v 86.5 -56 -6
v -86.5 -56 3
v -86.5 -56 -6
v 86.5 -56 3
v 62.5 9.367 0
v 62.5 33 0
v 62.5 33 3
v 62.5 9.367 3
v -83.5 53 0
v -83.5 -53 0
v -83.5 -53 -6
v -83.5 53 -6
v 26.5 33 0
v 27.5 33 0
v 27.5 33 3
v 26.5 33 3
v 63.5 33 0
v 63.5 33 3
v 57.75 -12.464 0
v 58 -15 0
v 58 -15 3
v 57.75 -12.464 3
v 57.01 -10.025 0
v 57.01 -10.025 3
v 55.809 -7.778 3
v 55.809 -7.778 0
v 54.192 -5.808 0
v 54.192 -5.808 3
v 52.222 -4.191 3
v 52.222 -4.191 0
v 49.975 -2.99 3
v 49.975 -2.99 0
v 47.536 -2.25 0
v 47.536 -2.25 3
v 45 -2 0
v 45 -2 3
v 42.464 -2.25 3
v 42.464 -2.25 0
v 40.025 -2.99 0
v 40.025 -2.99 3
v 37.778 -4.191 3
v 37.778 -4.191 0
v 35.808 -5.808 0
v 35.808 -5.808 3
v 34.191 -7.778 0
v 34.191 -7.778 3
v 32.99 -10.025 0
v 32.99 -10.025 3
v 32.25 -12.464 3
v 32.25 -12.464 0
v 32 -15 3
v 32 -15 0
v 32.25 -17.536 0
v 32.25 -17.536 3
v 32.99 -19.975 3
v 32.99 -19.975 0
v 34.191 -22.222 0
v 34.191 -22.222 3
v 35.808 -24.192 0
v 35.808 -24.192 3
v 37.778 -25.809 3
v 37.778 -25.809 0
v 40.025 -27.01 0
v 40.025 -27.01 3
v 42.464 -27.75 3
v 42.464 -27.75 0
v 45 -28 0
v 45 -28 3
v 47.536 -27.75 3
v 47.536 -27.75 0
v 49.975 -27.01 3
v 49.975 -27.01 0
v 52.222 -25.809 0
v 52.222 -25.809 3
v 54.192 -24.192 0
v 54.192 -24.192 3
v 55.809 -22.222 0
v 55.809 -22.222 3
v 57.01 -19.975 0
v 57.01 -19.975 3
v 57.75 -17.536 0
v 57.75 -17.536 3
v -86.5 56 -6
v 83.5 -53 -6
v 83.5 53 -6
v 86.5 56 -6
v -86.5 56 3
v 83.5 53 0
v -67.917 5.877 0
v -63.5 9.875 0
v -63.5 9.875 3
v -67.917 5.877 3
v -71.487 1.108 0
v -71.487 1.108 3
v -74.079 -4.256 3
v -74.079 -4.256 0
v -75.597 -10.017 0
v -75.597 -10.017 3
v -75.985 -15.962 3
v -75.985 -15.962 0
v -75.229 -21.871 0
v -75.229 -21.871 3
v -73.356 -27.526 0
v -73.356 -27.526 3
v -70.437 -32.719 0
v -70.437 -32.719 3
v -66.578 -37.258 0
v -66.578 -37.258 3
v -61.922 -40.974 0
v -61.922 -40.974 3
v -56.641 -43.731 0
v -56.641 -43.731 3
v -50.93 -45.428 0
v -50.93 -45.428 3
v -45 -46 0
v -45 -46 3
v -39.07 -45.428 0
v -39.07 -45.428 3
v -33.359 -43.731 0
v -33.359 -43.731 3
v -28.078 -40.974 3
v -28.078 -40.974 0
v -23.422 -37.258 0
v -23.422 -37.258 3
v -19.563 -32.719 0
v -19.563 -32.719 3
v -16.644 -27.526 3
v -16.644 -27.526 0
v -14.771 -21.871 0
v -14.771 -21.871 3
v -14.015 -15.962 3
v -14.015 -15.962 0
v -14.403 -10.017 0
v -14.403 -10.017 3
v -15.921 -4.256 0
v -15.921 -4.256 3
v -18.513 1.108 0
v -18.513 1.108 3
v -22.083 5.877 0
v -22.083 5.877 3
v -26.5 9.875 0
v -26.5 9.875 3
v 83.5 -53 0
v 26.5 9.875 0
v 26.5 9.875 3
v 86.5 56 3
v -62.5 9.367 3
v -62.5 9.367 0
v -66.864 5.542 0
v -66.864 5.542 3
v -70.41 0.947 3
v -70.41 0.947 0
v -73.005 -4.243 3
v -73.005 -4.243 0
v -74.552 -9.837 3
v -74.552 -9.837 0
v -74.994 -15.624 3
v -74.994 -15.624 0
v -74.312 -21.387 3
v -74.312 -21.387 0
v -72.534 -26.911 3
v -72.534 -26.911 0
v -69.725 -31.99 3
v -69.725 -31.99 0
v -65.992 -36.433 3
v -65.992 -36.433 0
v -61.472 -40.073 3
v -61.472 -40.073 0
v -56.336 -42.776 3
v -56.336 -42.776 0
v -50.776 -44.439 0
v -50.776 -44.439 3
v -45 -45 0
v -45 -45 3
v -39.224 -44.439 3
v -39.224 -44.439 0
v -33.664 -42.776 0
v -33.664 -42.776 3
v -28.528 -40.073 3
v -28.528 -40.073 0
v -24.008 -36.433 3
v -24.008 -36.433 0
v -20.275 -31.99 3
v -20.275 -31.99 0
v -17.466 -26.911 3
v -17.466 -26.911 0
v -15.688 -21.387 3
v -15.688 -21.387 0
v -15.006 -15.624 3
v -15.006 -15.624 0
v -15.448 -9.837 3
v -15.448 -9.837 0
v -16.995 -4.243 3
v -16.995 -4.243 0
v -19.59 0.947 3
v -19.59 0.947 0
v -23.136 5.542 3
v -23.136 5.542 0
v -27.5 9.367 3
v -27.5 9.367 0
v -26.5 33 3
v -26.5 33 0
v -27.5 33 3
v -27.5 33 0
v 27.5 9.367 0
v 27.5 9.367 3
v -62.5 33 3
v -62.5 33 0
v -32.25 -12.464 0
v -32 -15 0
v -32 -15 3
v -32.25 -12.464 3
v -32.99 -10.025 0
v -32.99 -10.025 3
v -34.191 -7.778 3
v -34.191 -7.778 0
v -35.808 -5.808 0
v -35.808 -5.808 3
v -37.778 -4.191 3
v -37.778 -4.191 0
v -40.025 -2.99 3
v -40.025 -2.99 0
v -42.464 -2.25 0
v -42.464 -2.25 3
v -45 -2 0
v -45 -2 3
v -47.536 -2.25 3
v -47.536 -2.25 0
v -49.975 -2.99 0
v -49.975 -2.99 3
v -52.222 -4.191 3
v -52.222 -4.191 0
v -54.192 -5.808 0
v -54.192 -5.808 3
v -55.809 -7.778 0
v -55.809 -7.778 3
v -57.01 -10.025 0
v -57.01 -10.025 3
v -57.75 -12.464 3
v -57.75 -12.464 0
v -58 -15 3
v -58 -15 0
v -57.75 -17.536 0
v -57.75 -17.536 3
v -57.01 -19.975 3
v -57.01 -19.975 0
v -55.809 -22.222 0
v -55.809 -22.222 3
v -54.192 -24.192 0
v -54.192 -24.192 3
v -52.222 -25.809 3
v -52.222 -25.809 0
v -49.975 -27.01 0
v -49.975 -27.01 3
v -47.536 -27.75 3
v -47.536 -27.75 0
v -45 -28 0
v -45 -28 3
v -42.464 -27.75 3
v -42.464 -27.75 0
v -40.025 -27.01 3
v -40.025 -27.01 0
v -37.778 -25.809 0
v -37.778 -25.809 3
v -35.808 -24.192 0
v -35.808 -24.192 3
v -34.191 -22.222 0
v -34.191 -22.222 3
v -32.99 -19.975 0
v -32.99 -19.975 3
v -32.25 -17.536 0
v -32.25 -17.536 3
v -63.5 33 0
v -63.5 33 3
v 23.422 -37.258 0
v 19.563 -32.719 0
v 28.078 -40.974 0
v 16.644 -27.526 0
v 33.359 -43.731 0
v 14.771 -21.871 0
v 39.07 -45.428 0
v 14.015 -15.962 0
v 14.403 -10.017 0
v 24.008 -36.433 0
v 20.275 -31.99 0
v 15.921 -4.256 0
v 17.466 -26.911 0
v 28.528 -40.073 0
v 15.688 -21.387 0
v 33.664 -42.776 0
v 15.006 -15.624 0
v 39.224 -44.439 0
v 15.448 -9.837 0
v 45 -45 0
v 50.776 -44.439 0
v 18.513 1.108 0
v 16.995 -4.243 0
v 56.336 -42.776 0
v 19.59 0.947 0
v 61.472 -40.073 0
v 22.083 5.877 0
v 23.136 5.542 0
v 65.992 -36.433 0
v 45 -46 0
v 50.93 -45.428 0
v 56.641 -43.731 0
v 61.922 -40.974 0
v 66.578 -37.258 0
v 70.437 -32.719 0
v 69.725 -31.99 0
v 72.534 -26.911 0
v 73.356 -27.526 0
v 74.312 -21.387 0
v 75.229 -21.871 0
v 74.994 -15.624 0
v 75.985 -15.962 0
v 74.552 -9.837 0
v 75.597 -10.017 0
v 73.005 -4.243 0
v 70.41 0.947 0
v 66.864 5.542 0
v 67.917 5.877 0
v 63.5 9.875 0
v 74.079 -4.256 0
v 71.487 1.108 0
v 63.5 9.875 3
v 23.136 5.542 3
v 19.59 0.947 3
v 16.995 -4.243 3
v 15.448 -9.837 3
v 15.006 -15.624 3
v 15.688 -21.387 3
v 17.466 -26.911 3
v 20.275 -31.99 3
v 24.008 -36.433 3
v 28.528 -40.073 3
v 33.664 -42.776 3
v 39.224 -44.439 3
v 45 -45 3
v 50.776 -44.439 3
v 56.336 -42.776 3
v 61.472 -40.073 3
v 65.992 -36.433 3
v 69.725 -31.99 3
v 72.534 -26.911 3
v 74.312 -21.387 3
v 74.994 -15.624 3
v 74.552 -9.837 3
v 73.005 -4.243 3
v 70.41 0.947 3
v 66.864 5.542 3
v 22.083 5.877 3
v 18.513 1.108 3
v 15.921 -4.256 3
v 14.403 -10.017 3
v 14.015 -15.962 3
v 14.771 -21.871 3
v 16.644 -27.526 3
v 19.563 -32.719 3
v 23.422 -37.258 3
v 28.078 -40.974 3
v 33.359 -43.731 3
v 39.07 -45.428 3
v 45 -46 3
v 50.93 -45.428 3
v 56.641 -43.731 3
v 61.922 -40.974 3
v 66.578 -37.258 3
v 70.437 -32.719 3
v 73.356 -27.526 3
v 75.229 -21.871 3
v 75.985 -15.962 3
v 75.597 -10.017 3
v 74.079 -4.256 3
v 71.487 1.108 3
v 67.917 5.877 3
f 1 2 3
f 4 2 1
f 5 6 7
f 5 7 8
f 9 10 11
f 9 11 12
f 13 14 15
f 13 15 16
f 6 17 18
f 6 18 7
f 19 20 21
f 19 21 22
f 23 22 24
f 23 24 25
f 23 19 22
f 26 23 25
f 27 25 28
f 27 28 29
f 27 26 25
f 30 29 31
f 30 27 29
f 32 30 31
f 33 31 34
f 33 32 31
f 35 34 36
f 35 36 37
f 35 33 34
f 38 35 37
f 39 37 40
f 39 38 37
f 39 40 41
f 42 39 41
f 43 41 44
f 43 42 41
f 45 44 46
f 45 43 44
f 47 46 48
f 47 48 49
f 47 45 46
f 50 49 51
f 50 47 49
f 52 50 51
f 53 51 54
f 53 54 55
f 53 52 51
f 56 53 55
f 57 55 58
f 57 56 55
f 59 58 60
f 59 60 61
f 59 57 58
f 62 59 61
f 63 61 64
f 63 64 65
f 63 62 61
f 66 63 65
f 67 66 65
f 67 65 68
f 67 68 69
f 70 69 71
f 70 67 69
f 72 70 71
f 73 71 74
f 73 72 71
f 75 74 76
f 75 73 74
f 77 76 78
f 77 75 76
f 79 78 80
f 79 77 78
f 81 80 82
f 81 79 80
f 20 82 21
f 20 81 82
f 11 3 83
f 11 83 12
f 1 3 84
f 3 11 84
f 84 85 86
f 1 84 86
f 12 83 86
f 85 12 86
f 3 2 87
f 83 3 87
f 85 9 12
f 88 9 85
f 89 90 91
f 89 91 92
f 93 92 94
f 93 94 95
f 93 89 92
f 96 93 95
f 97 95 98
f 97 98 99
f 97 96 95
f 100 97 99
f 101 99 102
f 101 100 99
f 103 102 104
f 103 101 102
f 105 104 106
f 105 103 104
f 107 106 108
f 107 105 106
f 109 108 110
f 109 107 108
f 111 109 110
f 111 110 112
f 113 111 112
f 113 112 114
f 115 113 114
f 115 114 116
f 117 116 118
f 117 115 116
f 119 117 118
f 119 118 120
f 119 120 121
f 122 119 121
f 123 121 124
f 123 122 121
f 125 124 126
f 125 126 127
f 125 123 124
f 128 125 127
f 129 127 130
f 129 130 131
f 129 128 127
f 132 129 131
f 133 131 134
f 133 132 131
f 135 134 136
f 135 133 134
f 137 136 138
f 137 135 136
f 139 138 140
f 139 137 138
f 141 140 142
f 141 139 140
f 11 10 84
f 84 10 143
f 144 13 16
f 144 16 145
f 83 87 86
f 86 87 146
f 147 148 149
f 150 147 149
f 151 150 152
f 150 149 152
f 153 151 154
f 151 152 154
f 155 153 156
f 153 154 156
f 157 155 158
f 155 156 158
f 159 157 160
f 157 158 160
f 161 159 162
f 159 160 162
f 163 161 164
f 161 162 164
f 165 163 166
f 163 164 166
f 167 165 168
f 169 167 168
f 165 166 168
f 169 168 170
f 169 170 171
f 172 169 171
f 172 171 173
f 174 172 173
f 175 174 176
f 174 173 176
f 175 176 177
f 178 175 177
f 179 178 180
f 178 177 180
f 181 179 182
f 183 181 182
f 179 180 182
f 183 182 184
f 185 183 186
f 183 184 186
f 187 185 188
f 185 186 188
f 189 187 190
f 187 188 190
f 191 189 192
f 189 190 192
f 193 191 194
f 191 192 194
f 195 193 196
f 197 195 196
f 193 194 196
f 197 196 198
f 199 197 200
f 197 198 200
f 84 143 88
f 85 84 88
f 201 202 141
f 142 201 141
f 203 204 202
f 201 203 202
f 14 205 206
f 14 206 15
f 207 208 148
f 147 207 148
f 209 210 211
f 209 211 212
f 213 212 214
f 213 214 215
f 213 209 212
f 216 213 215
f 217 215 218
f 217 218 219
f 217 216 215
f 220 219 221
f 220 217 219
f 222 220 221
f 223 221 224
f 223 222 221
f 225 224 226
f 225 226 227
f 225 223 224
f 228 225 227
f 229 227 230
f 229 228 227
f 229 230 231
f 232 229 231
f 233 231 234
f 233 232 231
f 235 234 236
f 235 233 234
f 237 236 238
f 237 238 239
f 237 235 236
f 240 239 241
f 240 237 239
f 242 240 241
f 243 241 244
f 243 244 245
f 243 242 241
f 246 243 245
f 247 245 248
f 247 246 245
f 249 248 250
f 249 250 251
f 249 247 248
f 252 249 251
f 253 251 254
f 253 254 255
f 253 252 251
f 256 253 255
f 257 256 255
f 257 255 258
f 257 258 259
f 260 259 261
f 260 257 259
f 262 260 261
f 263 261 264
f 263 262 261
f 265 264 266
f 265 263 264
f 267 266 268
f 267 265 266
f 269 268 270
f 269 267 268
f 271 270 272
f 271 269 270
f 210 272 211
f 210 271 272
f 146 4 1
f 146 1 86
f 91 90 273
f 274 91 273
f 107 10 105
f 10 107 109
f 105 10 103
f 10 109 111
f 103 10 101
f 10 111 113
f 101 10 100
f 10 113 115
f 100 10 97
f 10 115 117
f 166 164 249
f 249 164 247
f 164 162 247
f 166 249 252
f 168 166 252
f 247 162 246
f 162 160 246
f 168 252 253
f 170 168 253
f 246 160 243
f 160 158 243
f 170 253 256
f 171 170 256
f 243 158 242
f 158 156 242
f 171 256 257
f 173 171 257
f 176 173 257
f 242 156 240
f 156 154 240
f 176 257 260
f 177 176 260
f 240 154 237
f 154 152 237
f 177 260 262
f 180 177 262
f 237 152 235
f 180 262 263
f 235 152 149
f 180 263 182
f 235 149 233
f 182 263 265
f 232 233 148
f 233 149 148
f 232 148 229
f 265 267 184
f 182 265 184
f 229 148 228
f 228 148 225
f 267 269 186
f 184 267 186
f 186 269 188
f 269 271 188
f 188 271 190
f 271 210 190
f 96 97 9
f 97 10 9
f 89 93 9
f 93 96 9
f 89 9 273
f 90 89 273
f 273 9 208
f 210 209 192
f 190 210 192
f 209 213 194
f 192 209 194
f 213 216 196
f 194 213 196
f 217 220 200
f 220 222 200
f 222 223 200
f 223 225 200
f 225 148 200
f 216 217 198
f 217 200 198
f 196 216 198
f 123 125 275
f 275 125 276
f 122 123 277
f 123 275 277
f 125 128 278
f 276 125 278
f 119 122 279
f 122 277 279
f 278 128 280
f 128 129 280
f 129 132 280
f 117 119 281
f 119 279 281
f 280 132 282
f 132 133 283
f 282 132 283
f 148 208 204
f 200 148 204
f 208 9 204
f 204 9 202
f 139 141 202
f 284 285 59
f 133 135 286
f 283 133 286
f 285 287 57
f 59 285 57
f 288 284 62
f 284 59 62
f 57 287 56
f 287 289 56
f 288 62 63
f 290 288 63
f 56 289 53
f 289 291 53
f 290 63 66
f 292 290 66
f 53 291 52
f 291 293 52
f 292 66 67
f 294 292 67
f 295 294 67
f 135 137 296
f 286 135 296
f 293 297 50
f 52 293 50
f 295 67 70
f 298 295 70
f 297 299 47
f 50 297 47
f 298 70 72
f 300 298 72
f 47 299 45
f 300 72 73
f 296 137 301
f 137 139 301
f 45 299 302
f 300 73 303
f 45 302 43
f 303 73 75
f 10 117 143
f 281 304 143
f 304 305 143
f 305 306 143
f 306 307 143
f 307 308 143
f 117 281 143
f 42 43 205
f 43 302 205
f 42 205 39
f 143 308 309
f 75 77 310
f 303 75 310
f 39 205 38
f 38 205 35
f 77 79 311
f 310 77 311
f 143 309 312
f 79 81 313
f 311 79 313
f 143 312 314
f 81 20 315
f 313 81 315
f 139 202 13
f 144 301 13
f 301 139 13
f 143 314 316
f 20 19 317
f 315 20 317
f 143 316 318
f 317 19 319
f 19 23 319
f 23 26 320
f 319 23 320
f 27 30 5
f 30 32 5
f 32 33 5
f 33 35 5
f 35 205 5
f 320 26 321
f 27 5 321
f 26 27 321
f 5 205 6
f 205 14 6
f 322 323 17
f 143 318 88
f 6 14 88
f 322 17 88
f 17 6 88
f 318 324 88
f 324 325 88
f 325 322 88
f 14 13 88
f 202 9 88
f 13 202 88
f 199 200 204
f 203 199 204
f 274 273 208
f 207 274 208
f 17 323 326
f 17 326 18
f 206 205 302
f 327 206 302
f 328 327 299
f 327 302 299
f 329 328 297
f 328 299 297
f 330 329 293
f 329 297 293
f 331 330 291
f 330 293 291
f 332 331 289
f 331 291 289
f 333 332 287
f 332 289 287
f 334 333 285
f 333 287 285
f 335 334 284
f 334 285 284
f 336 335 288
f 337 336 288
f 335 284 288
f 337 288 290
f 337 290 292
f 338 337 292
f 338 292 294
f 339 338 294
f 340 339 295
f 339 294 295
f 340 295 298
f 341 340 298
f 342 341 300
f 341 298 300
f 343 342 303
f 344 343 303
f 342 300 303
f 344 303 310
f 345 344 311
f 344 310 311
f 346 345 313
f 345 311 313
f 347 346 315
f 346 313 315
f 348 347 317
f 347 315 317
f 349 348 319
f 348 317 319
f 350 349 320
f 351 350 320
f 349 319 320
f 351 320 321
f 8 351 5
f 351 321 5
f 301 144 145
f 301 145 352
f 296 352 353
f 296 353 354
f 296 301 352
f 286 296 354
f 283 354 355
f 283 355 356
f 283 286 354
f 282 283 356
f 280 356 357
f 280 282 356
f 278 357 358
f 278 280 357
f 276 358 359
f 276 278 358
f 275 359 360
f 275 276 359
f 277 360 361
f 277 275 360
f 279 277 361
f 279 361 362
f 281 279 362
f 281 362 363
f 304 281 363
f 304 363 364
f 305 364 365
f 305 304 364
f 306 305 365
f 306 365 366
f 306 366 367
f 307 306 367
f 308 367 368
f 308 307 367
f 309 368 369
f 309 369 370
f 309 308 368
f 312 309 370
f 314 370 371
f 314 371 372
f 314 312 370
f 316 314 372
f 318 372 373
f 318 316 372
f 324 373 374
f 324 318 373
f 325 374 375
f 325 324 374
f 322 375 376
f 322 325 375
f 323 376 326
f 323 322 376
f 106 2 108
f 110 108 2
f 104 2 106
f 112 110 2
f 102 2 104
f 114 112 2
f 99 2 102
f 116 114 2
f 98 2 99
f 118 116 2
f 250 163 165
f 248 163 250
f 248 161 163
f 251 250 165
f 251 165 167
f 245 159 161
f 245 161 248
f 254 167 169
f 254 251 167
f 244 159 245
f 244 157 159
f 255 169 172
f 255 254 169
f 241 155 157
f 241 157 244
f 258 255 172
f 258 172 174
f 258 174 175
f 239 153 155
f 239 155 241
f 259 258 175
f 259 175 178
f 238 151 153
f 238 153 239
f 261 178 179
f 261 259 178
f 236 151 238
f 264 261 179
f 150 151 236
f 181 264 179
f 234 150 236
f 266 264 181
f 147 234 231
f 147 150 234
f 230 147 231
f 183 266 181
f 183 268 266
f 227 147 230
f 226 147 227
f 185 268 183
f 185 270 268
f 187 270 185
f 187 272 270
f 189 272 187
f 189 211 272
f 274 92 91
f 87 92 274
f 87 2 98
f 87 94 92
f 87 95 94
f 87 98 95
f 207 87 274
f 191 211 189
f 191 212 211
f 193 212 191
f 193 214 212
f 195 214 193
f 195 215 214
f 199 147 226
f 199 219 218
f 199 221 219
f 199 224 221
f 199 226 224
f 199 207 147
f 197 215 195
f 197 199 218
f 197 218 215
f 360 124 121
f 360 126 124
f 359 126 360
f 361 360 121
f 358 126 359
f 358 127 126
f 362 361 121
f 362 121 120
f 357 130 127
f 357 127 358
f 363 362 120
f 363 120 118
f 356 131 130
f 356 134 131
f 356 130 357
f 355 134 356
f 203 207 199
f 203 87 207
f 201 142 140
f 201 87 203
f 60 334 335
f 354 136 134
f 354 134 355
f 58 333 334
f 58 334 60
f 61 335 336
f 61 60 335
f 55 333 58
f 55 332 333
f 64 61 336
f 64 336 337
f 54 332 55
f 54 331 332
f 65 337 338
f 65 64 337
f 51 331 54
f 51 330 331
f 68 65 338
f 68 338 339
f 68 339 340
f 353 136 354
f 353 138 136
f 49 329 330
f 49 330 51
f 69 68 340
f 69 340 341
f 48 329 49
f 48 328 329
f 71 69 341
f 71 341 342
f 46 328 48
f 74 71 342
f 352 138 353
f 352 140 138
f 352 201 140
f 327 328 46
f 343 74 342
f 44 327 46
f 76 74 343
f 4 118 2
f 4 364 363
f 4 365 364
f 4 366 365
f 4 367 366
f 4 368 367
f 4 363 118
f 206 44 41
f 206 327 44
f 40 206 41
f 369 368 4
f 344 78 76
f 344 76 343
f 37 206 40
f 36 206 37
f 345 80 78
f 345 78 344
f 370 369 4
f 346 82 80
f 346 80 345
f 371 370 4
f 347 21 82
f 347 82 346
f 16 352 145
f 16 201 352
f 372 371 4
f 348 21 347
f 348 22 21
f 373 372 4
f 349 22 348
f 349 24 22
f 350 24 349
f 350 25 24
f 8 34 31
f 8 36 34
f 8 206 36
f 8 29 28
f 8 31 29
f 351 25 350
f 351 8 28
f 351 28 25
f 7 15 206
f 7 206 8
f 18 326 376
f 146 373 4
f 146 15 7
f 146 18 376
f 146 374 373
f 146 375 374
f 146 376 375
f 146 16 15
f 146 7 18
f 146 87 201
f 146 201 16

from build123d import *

# Parameters (mm, degrees)
SKETCH002_W           = 173
SKETCH002_H           = 112
SKETCH002_W_2         = 167
SKETCH002_H_2         = 106
EXTRUDE001_DEPTH      = 3
EXTRUDE001_DEPTH_BACK = 6
SKETCH_W              = 167
SKETCH_H              = 106
SKETCH_R              = 13
EXTRUDE_DEPTH         = 3


with BuildPart() as notch:
    # Sketch002 → Extrude001 (new body, two sides)
    with BuildSketch(Plane.XY) as extrude001_sk:
        Rectangle(SKETCH002_W, SKETCH002_H)
        Rectangle(SKETCH002_W_2, SKETCH002_H_2, mode=Mode.SUBTRACT)
    extrude(amount=EXTRUDE001_DEPTH)
    extrude(extrude001_sk.sketch, amount=-EXTRUDE001_DEPTH_BACK)


with BuildPart() as lid:
    # Sketch → Extrude (new body)
    with BuildSketch(Plane.XY):
        Rectangle(SKETCH_W, SKETCH_H)
        with Locations((-45, -15)):
            Circle(SKETCH_R, mode=Mode.SUBTRACT)
        with Locations((45, -15)):
            Circle(SKETCH_R, mode=Mode.SUBTRACT)
        with BuildLine():
            Line((-27.5, 9.366986), (-27.5, 33))
            Line((-27.5, 33), (-26.5, 33))
            Line((-26.5, 33), (-26.5, 9.874686))
            ThreePointArc((-63.5, 9.874686), (-45, -46), (-26.5, 9.874686))
            Line((-63.5, 9.874686), (-63.5, 33))
            Line((-63.5, 33), (-62.5, 33))
            Line((-62.5, 33), (-62.5, 9.366986))
            ThreePointArc((-62.5, 9.366986), (-45, -45), (-27.5, 9.366986))
        make_face(mode=Mode.SUBTRACT)
        with BuildLine():
            Line((27.5, 9.366986), (27.5, 33))
            Line((27.5, 33), (26.5, 33))
            Line((26.5, 33), (26.5, 9.874686))
            ThreePointArc((26.5, 9.874686), (45, -46), (63.5, 9.874686))
            Line((63.5, 9.874686), (63.5, 33))
            Line((63.5, 33), (62.5, 33))
            Line((62.5, 33), (62.5, 9.366986))
            ThreePointArc((27.5, 9.366986), (45, -45), (62.5, 9.366986))
        make_face(mode=Mode.SUBTRACT)
    extrude(amount=EXTRUDE_DEPTH)

    # Fusion001: union Notch
    add(notch.part)


solid = lid.part
